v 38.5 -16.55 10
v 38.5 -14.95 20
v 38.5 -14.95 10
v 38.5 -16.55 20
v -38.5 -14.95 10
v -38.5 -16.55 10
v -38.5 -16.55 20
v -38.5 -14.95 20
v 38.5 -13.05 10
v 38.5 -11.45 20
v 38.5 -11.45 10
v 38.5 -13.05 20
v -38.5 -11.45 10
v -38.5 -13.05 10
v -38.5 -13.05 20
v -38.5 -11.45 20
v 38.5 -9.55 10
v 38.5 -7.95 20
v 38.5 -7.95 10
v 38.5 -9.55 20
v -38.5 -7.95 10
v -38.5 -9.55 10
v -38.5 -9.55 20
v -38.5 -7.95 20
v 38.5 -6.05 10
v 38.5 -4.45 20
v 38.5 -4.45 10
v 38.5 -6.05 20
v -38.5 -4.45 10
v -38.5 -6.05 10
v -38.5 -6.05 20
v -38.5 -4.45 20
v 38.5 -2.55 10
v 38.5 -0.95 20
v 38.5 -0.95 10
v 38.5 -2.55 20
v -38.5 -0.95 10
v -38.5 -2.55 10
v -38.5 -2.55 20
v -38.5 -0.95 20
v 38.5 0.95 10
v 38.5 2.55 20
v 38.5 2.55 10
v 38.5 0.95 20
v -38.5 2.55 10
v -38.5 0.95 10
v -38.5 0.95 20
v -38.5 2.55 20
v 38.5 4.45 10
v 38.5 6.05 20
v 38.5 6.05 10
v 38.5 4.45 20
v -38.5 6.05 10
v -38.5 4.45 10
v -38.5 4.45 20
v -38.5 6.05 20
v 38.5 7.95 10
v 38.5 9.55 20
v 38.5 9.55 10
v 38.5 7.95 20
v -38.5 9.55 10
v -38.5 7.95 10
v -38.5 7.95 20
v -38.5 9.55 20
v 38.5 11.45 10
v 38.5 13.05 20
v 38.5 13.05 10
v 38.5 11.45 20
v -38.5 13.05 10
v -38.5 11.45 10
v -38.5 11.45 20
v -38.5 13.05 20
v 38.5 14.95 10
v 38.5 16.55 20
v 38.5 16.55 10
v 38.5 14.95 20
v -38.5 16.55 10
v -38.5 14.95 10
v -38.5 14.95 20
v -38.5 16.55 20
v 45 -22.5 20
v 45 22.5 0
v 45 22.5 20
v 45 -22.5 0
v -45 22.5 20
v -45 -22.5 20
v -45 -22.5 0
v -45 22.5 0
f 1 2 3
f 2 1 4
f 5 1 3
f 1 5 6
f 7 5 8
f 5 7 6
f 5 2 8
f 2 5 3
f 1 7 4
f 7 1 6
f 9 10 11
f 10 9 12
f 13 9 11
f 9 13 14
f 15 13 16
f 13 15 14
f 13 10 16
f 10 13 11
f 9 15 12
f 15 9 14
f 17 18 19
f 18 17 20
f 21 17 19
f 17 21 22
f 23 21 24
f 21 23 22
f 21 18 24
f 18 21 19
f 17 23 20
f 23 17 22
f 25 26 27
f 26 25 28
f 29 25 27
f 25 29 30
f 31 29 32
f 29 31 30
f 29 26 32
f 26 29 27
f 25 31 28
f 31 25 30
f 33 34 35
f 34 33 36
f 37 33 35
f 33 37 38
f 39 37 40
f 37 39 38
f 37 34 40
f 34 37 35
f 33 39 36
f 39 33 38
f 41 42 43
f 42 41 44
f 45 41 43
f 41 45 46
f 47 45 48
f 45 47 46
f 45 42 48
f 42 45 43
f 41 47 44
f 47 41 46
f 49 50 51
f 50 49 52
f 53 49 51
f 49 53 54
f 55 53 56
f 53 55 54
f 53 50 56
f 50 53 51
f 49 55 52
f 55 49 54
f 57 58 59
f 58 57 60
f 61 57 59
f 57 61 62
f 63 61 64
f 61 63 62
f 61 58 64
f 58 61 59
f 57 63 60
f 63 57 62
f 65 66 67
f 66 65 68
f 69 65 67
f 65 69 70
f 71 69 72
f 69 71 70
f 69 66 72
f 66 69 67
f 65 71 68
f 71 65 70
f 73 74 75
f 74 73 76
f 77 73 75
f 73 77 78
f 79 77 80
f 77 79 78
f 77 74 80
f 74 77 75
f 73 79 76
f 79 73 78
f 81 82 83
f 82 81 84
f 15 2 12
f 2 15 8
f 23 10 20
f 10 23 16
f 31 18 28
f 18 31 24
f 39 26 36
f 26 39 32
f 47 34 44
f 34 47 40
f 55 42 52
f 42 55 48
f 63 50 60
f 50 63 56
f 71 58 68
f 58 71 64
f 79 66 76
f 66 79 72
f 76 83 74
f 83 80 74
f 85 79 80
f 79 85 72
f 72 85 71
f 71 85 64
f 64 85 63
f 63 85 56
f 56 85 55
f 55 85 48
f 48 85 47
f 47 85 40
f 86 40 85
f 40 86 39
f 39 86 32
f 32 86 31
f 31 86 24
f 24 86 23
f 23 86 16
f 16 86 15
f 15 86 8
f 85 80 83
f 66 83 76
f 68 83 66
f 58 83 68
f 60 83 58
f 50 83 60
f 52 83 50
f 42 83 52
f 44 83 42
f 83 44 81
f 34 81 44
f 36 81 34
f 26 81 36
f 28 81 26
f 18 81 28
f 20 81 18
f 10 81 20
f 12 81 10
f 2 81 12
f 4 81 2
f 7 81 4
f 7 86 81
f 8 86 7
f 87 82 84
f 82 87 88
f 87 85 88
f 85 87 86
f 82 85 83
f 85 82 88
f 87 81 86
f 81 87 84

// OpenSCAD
// Microscope slide drying rack
// 10 slides standing on their long edge, side by side

// ---- Block ----
block_l = 90;    // X length of base block
block_w = 45;    // Y width of base block
block_h = 20;    // Z height of base block

// ---- Slots ----
slot_count = 10;     // number of slide slots
slot_len   = 77;     // slot length along X
slot_w     = 1.6;    // slot width along Y
slot_depth = 10;     // slot depth from top face
slot_pitch = 3.5;    // centre-to-centre spacing along Y

// ---- Misc ----
eps = 0.5;          // overshoot for clean cuts
$fn = 64;

difference() {
    // Base block, centred in X/Y, resting on z = 0
    translate([-block_l/2, -block_w/2, 0])
        cube([block_l, block_w, block_h]);

    // Slots, centred in X/Y, open at the top
    for (i = [0 : slot_count - 1]) {
        x = (i - (slot_count - 1)/2) * slot_pitch;
        translate([-slot_len/2, x - slot_w/2, block_h - slot_depth])
            cube([slot_len, slot_w, slot_depth + eps]);
    }
}
